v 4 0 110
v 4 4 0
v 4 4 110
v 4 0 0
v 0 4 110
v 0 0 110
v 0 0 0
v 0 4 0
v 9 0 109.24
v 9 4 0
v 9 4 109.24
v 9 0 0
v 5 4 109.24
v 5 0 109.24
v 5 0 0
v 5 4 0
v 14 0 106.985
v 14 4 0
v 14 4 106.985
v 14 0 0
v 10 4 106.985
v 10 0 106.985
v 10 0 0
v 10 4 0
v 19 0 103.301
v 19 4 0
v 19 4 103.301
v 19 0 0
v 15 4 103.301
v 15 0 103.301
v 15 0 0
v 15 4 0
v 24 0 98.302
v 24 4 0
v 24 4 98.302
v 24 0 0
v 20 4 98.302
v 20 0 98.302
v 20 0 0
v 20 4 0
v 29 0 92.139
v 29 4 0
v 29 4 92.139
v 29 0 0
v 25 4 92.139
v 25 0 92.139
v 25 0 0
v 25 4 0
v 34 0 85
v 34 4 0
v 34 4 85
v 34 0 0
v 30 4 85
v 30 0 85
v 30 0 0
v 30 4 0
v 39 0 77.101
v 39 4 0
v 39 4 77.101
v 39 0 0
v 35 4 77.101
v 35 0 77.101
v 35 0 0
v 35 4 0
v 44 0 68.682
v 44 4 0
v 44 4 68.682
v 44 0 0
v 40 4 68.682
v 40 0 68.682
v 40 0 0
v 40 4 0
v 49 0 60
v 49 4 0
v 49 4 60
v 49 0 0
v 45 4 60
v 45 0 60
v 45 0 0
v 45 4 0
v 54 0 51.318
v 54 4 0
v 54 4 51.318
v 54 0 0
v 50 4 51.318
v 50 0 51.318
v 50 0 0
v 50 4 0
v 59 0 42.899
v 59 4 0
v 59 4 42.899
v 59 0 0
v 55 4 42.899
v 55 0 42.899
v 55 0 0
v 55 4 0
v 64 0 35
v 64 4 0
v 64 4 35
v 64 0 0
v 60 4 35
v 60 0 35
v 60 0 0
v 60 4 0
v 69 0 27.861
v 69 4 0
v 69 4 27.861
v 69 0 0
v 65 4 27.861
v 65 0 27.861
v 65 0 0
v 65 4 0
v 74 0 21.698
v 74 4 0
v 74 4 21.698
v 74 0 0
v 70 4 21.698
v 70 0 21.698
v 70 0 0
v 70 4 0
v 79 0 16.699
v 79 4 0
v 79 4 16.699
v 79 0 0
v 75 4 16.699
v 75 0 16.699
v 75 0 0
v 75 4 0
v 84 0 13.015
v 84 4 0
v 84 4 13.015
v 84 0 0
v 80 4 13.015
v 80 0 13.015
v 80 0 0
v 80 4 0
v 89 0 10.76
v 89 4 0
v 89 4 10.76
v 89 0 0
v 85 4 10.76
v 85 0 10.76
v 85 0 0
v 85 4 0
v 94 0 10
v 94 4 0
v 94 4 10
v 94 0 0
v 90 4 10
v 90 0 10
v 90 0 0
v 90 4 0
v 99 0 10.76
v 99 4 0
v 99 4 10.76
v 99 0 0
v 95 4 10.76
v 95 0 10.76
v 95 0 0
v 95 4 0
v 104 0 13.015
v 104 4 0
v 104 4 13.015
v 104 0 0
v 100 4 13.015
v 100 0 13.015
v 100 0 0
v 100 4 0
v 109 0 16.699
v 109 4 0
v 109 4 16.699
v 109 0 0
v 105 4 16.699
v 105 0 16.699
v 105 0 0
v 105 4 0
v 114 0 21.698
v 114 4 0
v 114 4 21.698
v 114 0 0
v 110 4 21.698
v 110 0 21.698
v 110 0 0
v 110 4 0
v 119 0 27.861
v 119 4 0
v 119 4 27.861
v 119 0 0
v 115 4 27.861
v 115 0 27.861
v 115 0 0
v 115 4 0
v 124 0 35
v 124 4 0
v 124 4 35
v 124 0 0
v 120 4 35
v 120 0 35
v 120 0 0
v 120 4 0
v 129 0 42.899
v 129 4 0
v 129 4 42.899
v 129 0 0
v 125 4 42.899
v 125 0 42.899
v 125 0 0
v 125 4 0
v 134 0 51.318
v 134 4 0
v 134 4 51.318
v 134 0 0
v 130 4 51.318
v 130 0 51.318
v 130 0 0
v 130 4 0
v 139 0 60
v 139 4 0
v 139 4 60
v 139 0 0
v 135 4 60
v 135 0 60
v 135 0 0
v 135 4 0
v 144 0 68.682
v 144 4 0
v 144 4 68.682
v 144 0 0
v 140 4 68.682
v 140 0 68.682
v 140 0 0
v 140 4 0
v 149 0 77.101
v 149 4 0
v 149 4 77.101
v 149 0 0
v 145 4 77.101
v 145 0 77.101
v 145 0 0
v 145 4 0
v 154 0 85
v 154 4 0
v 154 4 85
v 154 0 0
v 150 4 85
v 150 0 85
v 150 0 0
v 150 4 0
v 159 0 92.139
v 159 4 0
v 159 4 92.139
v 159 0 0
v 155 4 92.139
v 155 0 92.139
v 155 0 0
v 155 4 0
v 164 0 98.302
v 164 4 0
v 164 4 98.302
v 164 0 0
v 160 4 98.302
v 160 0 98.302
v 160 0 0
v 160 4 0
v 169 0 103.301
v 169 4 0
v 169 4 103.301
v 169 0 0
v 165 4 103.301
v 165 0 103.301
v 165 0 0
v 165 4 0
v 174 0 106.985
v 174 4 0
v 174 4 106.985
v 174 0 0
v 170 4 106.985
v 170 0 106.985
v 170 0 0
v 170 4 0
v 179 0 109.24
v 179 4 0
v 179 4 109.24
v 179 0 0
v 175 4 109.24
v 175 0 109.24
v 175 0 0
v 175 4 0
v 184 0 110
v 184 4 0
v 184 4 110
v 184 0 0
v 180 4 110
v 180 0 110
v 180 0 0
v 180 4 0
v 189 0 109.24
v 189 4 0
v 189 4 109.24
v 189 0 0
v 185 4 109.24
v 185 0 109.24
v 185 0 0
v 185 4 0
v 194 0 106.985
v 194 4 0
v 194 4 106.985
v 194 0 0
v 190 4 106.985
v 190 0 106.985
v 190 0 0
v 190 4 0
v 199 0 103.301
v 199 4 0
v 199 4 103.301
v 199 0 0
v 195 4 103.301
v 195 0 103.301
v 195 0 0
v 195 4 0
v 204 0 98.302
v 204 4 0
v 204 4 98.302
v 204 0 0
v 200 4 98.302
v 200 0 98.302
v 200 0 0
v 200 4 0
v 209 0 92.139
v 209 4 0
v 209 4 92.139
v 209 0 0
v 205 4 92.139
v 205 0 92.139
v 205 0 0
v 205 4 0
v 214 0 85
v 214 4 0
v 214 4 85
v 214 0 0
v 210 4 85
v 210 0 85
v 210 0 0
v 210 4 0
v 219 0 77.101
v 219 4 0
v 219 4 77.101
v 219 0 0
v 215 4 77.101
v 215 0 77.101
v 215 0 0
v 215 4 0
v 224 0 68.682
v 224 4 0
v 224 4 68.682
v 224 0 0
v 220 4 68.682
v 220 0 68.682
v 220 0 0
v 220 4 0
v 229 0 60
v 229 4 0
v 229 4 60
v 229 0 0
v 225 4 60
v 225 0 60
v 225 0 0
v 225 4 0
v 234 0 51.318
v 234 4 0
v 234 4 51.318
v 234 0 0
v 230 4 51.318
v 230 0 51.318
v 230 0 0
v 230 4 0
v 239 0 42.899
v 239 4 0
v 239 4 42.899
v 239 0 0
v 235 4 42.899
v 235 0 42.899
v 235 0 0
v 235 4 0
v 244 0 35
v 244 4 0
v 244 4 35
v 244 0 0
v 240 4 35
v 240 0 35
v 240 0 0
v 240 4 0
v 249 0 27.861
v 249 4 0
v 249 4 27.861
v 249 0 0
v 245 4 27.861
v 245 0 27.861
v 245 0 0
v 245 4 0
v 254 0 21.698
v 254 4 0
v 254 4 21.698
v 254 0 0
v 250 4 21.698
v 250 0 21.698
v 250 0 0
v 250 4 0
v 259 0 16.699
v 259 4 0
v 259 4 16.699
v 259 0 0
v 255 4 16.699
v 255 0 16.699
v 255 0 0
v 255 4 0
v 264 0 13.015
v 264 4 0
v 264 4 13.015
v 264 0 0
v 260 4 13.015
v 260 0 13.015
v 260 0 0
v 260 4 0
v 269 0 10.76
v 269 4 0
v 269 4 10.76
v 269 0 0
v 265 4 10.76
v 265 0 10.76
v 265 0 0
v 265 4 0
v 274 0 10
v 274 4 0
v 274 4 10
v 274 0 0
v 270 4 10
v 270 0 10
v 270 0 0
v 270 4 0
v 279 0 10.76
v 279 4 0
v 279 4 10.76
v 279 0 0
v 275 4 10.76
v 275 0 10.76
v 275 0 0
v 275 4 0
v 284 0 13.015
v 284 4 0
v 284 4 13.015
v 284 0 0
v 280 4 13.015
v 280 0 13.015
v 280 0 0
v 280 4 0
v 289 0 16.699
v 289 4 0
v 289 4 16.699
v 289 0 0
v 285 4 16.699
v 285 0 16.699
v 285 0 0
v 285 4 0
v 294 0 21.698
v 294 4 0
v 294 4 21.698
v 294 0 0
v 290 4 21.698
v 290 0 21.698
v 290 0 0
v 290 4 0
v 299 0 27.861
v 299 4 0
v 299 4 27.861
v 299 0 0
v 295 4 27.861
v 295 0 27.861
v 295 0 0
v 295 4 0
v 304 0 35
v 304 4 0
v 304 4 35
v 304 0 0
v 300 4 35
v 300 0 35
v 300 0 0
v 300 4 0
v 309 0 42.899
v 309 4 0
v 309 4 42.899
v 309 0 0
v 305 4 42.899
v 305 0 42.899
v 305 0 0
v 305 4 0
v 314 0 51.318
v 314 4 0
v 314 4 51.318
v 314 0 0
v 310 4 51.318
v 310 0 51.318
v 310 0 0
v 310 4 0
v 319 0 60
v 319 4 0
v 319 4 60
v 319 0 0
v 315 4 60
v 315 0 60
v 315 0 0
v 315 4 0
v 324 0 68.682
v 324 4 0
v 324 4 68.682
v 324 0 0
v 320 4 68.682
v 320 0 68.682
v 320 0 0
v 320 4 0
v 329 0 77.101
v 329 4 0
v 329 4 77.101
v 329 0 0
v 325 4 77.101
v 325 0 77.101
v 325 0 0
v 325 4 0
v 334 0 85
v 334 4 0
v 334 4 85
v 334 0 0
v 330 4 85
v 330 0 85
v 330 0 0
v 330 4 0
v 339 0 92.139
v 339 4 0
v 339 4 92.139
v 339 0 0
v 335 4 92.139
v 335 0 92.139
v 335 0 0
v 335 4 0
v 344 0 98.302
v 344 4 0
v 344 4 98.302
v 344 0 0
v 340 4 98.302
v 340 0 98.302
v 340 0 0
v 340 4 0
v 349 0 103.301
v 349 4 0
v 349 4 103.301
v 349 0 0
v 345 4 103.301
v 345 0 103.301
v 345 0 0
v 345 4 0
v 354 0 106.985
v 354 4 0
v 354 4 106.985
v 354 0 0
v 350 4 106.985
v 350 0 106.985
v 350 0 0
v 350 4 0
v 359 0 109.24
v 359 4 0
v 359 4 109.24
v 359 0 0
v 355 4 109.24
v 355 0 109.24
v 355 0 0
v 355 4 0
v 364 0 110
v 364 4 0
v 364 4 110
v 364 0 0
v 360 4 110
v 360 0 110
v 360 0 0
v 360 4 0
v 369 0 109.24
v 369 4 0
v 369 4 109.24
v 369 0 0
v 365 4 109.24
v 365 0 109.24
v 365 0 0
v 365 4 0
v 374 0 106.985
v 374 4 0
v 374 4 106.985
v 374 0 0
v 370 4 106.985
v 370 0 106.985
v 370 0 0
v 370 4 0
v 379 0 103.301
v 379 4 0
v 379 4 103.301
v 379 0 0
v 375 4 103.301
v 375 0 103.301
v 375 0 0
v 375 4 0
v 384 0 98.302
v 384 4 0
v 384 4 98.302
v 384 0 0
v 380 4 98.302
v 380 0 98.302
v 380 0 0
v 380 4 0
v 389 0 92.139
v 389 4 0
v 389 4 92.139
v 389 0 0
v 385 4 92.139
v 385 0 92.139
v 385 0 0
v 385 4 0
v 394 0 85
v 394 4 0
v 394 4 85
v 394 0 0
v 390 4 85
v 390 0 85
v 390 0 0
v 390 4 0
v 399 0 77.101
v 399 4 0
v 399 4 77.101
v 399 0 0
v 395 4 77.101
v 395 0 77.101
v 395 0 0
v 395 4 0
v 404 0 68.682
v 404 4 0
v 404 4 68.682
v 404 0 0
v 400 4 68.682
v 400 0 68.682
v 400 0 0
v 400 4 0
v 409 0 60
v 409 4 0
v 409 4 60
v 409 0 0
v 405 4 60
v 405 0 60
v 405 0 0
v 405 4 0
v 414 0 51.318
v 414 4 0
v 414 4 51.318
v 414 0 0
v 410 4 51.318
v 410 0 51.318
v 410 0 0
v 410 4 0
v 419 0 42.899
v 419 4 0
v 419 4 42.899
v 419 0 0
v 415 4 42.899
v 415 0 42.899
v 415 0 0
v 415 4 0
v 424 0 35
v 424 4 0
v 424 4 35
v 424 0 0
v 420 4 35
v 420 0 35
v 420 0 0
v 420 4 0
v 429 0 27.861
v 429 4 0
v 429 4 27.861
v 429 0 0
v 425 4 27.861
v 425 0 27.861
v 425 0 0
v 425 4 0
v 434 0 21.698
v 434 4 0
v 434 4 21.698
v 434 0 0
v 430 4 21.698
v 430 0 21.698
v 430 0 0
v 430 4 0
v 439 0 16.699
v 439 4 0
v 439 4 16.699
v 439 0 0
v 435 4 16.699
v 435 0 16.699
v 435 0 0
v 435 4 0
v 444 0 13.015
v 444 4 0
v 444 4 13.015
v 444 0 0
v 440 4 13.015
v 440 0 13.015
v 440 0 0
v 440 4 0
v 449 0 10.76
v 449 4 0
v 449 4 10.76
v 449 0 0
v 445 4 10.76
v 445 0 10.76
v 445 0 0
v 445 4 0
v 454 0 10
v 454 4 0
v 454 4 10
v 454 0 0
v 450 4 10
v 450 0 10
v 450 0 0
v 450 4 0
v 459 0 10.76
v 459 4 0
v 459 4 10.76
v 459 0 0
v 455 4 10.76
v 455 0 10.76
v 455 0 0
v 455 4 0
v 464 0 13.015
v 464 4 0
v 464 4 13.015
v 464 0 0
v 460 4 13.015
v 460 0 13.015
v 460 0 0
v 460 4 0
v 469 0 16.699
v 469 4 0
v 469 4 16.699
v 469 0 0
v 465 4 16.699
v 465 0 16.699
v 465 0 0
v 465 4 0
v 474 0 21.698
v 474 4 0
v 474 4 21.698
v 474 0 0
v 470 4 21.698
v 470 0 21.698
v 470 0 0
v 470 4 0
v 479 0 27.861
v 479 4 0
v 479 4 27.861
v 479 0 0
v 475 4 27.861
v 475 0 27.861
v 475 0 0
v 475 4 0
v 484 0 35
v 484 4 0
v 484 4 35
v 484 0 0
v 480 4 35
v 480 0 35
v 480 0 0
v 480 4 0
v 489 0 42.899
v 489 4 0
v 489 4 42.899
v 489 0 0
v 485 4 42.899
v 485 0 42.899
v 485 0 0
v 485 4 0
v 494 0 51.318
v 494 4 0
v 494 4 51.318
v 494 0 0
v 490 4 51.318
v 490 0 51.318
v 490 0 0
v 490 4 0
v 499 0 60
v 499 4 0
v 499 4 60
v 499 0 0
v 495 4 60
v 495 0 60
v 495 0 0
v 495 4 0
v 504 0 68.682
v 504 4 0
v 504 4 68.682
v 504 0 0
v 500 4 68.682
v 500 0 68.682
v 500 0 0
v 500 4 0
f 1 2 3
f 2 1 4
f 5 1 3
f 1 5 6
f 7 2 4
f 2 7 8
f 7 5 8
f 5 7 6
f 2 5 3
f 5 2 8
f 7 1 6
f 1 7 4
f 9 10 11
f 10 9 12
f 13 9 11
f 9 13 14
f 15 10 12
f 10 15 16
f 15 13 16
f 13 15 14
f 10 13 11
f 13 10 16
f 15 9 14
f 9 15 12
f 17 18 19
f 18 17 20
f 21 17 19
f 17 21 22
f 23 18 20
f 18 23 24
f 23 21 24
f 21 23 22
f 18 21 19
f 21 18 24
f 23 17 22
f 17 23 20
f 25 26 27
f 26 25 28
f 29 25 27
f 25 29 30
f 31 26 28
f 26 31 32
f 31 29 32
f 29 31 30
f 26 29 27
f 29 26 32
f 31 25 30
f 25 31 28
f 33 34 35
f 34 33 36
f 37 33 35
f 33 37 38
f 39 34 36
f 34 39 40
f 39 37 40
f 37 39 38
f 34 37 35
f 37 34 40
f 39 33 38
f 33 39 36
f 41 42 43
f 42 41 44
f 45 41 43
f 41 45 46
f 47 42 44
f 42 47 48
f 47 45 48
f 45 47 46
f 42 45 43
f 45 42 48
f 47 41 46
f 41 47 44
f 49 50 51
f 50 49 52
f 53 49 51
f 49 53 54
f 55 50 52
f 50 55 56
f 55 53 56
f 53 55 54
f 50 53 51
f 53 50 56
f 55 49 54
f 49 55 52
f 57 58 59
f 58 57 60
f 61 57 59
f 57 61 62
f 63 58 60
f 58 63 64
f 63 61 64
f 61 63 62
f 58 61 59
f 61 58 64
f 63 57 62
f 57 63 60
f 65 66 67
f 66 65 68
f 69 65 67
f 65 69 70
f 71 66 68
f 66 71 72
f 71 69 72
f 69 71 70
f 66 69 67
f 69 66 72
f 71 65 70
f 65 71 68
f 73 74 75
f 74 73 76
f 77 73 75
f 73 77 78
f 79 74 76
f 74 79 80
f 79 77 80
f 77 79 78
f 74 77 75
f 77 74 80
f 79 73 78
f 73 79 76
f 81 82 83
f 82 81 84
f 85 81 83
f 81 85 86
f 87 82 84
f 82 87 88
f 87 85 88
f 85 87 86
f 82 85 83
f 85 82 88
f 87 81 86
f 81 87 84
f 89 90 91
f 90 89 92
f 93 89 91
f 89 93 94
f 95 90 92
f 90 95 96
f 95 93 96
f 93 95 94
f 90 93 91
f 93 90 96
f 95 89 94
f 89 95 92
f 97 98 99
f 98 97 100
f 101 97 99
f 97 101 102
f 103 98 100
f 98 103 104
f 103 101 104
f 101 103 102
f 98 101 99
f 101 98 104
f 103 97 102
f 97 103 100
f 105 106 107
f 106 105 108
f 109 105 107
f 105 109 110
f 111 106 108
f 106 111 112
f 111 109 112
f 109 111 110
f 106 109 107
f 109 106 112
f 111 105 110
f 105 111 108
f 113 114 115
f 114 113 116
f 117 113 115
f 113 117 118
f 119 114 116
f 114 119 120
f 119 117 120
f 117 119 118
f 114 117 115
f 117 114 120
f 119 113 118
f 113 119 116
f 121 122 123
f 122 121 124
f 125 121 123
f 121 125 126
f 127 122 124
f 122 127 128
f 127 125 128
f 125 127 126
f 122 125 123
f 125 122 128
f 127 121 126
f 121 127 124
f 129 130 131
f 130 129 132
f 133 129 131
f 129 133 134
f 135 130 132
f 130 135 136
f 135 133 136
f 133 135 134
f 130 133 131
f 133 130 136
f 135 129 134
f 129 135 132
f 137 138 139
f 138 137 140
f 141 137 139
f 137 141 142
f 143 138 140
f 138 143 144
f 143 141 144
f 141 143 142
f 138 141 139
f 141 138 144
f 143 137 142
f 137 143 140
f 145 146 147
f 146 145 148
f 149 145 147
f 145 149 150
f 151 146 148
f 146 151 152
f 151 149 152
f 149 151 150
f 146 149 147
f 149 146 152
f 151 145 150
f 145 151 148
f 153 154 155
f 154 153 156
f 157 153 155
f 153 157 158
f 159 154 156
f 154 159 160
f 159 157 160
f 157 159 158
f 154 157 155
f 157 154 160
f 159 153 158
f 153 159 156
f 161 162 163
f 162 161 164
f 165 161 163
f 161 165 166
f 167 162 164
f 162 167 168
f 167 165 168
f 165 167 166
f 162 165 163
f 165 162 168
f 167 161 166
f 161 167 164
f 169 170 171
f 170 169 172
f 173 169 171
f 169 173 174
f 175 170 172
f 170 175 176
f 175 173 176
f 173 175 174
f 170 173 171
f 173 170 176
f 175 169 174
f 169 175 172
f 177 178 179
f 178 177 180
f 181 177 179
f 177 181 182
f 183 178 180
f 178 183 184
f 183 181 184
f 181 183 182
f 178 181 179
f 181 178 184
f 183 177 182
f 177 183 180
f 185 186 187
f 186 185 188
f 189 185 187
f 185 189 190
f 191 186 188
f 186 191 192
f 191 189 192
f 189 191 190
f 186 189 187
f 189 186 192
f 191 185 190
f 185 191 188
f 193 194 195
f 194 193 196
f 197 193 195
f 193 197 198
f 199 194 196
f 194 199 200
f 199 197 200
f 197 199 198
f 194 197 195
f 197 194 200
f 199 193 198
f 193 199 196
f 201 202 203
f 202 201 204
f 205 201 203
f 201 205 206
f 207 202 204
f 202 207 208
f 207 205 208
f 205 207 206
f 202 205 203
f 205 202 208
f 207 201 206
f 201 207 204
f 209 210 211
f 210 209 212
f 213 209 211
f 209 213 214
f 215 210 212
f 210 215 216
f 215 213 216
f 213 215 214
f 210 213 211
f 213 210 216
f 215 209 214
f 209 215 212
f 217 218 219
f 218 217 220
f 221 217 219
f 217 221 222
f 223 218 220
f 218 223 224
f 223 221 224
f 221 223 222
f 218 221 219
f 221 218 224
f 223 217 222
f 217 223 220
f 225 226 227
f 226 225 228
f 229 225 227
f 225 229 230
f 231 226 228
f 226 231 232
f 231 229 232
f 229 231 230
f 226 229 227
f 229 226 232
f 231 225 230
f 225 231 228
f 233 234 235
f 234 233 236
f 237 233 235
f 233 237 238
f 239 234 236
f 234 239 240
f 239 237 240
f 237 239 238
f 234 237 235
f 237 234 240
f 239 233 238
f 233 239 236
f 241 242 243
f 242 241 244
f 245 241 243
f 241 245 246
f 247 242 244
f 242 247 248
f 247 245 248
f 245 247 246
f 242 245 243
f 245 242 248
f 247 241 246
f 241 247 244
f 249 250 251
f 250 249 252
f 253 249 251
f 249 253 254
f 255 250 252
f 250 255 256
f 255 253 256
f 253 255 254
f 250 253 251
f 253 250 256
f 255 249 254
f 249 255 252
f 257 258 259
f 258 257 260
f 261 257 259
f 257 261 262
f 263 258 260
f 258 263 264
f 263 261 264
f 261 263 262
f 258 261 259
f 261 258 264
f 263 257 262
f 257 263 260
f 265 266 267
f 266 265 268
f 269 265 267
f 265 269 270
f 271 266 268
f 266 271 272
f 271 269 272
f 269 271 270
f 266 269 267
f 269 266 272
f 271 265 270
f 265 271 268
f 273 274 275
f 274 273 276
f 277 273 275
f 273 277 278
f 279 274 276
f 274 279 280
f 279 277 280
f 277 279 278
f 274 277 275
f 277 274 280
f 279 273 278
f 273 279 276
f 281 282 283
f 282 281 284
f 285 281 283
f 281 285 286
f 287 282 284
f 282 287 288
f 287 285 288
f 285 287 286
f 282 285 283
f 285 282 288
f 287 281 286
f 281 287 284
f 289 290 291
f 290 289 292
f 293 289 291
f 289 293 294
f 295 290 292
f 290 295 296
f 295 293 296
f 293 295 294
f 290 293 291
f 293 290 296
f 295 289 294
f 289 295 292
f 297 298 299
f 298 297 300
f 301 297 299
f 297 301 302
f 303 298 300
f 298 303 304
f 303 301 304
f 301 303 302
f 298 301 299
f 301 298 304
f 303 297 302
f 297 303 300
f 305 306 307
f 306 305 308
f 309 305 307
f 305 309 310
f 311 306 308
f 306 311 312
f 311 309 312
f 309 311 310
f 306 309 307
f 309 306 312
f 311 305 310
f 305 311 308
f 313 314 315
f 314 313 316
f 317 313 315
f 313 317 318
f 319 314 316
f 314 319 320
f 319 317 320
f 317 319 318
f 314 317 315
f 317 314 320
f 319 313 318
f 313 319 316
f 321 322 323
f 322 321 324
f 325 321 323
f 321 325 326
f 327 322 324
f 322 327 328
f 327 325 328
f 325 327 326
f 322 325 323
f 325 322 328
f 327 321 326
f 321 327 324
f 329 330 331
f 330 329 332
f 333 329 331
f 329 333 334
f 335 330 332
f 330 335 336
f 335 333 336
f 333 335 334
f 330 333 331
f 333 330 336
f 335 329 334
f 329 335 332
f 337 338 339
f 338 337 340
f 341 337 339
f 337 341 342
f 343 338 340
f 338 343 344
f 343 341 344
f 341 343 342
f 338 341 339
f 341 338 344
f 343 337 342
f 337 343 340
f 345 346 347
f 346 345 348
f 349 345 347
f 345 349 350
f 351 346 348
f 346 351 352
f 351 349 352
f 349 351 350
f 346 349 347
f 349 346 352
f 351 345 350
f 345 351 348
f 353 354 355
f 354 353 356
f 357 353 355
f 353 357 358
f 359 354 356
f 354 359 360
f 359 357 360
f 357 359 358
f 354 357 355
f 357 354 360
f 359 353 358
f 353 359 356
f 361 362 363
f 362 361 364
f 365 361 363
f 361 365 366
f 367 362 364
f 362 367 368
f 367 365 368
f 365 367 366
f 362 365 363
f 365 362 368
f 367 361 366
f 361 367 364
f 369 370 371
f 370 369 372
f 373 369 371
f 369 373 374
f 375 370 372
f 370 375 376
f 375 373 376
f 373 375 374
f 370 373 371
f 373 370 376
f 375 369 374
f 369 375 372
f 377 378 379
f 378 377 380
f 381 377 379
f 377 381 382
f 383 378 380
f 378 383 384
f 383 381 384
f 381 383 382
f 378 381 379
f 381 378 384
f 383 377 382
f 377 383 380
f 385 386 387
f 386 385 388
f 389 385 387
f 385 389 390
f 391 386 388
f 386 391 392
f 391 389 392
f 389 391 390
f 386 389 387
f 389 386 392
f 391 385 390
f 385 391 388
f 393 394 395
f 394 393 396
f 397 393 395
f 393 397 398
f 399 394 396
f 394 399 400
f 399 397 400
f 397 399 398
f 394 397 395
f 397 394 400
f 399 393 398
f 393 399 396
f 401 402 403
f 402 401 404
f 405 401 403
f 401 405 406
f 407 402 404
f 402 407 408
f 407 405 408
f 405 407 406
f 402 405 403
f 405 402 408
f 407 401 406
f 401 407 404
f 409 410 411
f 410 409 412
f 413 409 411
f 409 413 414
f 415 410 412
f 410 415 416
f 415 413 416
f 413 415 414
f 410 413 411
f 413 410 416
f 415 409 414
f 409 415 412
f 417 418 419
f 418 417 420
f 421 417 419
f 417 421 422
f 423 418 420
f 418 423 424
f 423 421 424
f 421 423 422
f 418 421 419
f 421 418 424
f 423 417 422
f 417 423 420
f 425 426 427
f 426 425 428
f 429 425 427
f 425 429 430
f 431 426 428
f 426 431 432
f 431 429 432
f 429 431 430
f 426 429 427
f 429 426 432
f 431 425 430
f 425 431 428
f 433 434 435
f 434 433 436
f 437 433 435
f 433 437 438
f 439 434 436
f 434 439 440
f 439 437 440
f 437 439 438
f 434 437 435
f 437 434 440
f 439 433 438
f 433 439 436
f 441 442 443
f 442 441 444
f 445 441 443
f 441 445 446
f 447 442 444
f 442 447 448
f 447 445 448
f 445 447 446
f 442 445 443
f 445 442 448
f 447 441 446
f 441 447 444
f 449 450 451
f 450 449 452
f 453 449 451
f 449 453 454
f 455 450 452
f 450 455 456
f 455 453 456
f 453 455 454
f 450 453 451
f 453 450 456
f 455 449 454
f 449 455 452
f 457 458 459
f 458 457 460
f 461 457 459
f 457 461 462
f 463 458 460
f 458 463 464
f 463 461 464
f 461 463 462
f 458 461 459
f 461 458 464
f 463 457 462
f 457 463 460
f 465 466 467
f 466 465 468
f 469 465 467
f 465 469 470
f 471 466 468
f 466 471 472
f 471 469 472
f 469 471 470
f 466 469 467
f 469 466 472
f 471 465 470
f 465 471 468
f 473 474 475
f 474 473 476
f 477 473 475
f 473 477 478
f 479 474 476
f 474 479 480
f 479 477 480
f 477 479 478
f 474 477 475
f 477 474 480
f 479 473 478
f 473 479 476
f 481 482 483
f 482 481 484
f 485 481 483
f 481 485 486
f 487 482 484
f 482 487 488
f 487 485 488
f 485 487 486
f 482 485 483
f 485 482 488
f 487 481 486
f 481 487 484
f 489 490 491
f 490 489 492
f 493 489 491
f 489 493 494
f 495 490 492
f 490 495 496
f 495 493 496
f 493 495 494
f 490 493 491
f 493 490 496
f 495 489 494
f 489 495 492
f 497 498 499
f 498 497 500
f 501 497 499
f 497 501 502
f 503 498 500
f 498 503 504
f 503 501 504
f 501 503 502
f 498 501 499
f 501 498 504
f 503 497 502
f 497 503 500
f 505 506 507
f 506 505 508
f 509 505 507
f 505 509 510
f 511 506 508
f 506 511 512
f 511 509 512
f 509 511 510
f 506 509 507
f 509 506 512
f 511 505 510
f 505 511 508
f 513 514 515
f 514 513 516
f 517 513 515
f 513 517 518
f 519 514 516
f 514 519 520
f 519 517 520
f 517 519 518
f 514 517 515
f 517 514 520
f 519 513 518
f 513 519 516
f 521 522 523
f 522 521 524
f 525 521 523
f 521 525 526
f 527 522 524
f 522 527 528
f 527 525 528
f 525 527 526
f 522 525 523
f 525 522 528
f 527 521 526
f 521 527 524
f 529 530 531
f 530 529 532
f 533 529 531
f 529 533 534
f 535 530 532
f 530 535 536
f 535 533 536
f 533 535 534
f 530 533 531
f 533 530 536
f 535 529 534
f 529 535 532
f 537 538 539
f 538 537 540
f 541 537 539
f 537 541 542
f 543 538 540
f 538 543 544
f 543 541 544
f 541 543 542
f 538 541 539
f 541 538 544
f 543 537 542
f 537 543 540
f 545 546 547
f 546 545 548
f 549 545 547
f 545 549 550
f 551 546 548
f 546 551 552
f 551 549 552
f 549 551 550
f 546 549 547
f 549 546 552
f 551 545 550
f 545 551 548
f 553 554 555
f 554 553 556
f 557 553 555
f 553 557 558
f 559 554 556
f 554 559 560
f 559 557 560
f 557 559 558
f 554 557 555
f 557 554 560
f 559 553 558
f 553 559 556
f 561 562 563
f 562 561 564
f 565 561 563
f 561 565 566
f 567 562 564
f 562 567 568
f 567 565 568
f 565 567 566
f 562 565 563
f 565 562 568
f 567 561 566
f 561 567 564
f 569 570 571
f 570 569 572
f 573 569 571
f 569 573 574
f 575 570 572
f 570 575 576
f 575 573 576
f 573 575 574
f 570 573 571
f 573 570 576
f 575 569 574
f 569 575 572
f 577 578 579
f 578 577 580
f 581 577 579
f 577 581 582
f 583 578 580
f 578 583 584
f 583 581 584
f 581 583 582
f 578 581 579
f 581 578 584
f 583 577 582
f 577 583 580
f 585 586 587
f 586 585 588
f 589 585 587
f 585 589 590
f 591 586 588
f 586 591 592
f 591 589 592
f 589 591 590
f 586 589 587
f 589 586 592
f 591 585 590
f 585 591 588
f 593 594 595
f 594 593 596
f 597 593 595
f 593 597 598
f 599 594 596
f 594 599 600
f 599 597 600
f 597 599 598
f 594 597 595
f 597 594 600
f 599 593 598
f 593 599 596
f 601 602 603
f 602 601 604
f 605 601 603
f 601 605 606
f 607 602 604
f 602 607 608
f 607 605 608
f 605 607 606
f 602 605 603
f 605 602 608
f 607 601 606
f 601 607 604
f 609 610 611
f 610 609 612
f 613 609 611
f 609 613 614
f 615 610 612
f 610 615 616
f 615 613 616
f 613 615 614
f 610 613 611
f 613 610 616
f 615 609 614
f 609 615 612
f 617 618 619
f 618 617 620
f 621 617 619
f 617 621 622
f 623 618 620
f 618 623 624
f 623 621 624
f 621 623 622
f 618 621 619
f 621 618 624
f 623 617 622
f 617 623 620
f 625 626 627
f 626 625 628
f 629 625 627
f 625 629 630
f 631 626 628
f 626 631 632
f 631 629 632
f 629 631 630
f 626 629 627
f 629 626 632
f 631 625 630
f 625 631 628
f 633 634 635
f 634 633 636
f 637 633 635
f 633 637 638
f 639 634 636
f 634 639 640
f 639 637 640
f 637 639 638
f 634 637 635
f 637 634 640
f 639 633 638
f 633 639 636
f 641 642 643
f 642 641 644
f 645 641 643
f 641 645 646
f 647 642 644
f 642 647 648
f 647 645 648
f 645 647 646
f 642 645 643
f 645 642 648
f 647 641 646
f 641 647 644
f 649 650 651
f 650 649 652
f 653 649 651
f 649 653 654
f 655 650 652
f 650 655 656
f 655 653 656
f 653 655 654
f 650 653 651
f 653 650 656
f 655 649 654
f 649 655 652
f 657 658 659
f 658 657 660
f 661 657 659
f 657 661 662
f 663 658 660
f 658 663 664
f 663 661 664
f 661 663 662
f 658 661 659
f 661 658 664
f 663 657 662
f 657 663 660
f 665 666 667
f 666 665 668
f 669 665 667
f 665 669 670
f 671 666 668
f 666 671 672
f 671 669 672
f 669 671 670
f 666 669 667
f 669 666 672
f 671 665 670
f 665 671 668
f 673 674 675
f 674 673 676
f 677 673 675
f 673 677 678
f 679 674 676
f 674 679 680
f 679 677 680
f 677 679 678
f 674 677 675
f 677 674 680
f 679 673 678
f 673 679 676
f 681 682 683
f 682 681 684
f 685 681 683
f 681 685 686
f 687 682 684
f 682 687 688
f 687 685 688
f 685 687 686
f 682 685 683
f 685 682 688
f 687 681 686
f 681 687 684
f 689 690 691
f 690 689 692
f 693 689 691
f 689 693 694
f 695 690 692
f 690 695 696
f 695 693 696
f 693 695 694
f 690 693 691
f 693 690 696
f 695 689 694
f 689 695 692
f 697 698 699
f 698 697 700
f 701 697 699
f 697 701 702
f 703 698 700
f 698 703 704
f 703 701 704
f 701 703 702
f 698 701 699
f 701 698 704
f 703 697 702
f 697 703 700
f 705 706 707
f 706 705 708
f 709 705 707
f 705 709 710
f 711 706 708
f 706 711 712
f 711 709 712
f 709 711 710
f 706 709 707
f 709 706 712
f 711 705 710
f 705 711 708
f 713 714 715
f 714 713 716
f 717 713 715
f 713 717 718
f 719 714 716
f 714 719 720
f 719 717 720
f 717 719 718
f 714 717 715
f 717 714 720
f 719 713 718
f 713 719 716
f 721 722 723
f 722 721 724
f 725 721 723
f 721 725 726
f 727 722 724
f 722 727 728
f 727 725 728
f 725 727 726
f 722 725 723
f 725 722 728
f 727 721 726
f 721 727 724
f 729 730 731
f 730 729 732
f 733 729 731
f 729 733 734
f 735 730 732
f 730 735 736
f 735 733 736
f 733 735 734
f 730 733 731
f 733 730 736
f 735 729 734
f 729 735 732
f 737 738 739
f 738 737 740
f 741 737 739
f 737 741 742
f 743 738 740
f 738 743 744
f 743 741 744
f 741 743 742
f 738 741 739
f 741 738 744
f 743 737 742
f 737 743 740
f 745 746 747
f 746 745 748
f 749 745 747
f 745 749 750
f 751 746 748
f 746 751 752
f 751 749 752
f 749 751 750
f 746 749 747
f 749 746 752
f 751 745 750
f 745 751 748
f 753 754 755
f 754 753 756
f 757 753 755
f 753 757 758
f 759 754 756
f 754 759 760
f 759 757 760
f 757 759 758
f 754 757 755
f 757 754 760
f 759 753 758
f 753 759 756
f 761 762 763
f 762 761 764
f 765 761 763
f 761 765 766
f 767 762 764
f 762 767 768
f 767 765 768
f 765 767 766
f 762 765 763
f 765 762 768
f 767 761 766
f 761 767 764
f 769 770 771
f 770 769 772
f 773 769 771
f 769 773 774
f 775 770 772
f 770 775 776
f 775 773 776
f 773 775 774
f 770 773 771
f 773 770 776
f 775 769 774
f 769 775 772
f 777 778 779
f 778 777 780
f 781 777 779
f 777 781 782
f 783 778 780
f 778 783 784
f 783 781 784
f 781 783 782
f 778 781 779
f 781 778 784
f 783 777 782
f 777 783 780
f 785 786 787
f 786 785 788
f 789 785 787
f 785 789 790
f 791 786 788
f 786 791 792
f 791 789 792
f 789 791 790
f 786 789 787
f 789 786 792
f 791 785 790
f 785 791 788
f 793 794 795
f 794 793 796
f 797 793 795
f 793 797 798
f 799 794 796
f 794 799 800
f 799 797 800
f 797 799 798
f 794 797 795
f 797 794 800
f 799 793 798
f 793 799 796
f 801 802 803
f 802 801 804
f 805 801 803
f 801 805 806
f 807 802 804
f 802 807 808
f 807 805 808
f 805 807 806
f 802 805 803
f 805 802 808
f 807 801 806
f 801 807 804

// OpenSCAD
module sinewave(length=50)
    for (i=[0:length])
        translate([i*5,0,0])
        cube([4,4,cos(i*10)*50+60]);
    
 sinewave(100);
